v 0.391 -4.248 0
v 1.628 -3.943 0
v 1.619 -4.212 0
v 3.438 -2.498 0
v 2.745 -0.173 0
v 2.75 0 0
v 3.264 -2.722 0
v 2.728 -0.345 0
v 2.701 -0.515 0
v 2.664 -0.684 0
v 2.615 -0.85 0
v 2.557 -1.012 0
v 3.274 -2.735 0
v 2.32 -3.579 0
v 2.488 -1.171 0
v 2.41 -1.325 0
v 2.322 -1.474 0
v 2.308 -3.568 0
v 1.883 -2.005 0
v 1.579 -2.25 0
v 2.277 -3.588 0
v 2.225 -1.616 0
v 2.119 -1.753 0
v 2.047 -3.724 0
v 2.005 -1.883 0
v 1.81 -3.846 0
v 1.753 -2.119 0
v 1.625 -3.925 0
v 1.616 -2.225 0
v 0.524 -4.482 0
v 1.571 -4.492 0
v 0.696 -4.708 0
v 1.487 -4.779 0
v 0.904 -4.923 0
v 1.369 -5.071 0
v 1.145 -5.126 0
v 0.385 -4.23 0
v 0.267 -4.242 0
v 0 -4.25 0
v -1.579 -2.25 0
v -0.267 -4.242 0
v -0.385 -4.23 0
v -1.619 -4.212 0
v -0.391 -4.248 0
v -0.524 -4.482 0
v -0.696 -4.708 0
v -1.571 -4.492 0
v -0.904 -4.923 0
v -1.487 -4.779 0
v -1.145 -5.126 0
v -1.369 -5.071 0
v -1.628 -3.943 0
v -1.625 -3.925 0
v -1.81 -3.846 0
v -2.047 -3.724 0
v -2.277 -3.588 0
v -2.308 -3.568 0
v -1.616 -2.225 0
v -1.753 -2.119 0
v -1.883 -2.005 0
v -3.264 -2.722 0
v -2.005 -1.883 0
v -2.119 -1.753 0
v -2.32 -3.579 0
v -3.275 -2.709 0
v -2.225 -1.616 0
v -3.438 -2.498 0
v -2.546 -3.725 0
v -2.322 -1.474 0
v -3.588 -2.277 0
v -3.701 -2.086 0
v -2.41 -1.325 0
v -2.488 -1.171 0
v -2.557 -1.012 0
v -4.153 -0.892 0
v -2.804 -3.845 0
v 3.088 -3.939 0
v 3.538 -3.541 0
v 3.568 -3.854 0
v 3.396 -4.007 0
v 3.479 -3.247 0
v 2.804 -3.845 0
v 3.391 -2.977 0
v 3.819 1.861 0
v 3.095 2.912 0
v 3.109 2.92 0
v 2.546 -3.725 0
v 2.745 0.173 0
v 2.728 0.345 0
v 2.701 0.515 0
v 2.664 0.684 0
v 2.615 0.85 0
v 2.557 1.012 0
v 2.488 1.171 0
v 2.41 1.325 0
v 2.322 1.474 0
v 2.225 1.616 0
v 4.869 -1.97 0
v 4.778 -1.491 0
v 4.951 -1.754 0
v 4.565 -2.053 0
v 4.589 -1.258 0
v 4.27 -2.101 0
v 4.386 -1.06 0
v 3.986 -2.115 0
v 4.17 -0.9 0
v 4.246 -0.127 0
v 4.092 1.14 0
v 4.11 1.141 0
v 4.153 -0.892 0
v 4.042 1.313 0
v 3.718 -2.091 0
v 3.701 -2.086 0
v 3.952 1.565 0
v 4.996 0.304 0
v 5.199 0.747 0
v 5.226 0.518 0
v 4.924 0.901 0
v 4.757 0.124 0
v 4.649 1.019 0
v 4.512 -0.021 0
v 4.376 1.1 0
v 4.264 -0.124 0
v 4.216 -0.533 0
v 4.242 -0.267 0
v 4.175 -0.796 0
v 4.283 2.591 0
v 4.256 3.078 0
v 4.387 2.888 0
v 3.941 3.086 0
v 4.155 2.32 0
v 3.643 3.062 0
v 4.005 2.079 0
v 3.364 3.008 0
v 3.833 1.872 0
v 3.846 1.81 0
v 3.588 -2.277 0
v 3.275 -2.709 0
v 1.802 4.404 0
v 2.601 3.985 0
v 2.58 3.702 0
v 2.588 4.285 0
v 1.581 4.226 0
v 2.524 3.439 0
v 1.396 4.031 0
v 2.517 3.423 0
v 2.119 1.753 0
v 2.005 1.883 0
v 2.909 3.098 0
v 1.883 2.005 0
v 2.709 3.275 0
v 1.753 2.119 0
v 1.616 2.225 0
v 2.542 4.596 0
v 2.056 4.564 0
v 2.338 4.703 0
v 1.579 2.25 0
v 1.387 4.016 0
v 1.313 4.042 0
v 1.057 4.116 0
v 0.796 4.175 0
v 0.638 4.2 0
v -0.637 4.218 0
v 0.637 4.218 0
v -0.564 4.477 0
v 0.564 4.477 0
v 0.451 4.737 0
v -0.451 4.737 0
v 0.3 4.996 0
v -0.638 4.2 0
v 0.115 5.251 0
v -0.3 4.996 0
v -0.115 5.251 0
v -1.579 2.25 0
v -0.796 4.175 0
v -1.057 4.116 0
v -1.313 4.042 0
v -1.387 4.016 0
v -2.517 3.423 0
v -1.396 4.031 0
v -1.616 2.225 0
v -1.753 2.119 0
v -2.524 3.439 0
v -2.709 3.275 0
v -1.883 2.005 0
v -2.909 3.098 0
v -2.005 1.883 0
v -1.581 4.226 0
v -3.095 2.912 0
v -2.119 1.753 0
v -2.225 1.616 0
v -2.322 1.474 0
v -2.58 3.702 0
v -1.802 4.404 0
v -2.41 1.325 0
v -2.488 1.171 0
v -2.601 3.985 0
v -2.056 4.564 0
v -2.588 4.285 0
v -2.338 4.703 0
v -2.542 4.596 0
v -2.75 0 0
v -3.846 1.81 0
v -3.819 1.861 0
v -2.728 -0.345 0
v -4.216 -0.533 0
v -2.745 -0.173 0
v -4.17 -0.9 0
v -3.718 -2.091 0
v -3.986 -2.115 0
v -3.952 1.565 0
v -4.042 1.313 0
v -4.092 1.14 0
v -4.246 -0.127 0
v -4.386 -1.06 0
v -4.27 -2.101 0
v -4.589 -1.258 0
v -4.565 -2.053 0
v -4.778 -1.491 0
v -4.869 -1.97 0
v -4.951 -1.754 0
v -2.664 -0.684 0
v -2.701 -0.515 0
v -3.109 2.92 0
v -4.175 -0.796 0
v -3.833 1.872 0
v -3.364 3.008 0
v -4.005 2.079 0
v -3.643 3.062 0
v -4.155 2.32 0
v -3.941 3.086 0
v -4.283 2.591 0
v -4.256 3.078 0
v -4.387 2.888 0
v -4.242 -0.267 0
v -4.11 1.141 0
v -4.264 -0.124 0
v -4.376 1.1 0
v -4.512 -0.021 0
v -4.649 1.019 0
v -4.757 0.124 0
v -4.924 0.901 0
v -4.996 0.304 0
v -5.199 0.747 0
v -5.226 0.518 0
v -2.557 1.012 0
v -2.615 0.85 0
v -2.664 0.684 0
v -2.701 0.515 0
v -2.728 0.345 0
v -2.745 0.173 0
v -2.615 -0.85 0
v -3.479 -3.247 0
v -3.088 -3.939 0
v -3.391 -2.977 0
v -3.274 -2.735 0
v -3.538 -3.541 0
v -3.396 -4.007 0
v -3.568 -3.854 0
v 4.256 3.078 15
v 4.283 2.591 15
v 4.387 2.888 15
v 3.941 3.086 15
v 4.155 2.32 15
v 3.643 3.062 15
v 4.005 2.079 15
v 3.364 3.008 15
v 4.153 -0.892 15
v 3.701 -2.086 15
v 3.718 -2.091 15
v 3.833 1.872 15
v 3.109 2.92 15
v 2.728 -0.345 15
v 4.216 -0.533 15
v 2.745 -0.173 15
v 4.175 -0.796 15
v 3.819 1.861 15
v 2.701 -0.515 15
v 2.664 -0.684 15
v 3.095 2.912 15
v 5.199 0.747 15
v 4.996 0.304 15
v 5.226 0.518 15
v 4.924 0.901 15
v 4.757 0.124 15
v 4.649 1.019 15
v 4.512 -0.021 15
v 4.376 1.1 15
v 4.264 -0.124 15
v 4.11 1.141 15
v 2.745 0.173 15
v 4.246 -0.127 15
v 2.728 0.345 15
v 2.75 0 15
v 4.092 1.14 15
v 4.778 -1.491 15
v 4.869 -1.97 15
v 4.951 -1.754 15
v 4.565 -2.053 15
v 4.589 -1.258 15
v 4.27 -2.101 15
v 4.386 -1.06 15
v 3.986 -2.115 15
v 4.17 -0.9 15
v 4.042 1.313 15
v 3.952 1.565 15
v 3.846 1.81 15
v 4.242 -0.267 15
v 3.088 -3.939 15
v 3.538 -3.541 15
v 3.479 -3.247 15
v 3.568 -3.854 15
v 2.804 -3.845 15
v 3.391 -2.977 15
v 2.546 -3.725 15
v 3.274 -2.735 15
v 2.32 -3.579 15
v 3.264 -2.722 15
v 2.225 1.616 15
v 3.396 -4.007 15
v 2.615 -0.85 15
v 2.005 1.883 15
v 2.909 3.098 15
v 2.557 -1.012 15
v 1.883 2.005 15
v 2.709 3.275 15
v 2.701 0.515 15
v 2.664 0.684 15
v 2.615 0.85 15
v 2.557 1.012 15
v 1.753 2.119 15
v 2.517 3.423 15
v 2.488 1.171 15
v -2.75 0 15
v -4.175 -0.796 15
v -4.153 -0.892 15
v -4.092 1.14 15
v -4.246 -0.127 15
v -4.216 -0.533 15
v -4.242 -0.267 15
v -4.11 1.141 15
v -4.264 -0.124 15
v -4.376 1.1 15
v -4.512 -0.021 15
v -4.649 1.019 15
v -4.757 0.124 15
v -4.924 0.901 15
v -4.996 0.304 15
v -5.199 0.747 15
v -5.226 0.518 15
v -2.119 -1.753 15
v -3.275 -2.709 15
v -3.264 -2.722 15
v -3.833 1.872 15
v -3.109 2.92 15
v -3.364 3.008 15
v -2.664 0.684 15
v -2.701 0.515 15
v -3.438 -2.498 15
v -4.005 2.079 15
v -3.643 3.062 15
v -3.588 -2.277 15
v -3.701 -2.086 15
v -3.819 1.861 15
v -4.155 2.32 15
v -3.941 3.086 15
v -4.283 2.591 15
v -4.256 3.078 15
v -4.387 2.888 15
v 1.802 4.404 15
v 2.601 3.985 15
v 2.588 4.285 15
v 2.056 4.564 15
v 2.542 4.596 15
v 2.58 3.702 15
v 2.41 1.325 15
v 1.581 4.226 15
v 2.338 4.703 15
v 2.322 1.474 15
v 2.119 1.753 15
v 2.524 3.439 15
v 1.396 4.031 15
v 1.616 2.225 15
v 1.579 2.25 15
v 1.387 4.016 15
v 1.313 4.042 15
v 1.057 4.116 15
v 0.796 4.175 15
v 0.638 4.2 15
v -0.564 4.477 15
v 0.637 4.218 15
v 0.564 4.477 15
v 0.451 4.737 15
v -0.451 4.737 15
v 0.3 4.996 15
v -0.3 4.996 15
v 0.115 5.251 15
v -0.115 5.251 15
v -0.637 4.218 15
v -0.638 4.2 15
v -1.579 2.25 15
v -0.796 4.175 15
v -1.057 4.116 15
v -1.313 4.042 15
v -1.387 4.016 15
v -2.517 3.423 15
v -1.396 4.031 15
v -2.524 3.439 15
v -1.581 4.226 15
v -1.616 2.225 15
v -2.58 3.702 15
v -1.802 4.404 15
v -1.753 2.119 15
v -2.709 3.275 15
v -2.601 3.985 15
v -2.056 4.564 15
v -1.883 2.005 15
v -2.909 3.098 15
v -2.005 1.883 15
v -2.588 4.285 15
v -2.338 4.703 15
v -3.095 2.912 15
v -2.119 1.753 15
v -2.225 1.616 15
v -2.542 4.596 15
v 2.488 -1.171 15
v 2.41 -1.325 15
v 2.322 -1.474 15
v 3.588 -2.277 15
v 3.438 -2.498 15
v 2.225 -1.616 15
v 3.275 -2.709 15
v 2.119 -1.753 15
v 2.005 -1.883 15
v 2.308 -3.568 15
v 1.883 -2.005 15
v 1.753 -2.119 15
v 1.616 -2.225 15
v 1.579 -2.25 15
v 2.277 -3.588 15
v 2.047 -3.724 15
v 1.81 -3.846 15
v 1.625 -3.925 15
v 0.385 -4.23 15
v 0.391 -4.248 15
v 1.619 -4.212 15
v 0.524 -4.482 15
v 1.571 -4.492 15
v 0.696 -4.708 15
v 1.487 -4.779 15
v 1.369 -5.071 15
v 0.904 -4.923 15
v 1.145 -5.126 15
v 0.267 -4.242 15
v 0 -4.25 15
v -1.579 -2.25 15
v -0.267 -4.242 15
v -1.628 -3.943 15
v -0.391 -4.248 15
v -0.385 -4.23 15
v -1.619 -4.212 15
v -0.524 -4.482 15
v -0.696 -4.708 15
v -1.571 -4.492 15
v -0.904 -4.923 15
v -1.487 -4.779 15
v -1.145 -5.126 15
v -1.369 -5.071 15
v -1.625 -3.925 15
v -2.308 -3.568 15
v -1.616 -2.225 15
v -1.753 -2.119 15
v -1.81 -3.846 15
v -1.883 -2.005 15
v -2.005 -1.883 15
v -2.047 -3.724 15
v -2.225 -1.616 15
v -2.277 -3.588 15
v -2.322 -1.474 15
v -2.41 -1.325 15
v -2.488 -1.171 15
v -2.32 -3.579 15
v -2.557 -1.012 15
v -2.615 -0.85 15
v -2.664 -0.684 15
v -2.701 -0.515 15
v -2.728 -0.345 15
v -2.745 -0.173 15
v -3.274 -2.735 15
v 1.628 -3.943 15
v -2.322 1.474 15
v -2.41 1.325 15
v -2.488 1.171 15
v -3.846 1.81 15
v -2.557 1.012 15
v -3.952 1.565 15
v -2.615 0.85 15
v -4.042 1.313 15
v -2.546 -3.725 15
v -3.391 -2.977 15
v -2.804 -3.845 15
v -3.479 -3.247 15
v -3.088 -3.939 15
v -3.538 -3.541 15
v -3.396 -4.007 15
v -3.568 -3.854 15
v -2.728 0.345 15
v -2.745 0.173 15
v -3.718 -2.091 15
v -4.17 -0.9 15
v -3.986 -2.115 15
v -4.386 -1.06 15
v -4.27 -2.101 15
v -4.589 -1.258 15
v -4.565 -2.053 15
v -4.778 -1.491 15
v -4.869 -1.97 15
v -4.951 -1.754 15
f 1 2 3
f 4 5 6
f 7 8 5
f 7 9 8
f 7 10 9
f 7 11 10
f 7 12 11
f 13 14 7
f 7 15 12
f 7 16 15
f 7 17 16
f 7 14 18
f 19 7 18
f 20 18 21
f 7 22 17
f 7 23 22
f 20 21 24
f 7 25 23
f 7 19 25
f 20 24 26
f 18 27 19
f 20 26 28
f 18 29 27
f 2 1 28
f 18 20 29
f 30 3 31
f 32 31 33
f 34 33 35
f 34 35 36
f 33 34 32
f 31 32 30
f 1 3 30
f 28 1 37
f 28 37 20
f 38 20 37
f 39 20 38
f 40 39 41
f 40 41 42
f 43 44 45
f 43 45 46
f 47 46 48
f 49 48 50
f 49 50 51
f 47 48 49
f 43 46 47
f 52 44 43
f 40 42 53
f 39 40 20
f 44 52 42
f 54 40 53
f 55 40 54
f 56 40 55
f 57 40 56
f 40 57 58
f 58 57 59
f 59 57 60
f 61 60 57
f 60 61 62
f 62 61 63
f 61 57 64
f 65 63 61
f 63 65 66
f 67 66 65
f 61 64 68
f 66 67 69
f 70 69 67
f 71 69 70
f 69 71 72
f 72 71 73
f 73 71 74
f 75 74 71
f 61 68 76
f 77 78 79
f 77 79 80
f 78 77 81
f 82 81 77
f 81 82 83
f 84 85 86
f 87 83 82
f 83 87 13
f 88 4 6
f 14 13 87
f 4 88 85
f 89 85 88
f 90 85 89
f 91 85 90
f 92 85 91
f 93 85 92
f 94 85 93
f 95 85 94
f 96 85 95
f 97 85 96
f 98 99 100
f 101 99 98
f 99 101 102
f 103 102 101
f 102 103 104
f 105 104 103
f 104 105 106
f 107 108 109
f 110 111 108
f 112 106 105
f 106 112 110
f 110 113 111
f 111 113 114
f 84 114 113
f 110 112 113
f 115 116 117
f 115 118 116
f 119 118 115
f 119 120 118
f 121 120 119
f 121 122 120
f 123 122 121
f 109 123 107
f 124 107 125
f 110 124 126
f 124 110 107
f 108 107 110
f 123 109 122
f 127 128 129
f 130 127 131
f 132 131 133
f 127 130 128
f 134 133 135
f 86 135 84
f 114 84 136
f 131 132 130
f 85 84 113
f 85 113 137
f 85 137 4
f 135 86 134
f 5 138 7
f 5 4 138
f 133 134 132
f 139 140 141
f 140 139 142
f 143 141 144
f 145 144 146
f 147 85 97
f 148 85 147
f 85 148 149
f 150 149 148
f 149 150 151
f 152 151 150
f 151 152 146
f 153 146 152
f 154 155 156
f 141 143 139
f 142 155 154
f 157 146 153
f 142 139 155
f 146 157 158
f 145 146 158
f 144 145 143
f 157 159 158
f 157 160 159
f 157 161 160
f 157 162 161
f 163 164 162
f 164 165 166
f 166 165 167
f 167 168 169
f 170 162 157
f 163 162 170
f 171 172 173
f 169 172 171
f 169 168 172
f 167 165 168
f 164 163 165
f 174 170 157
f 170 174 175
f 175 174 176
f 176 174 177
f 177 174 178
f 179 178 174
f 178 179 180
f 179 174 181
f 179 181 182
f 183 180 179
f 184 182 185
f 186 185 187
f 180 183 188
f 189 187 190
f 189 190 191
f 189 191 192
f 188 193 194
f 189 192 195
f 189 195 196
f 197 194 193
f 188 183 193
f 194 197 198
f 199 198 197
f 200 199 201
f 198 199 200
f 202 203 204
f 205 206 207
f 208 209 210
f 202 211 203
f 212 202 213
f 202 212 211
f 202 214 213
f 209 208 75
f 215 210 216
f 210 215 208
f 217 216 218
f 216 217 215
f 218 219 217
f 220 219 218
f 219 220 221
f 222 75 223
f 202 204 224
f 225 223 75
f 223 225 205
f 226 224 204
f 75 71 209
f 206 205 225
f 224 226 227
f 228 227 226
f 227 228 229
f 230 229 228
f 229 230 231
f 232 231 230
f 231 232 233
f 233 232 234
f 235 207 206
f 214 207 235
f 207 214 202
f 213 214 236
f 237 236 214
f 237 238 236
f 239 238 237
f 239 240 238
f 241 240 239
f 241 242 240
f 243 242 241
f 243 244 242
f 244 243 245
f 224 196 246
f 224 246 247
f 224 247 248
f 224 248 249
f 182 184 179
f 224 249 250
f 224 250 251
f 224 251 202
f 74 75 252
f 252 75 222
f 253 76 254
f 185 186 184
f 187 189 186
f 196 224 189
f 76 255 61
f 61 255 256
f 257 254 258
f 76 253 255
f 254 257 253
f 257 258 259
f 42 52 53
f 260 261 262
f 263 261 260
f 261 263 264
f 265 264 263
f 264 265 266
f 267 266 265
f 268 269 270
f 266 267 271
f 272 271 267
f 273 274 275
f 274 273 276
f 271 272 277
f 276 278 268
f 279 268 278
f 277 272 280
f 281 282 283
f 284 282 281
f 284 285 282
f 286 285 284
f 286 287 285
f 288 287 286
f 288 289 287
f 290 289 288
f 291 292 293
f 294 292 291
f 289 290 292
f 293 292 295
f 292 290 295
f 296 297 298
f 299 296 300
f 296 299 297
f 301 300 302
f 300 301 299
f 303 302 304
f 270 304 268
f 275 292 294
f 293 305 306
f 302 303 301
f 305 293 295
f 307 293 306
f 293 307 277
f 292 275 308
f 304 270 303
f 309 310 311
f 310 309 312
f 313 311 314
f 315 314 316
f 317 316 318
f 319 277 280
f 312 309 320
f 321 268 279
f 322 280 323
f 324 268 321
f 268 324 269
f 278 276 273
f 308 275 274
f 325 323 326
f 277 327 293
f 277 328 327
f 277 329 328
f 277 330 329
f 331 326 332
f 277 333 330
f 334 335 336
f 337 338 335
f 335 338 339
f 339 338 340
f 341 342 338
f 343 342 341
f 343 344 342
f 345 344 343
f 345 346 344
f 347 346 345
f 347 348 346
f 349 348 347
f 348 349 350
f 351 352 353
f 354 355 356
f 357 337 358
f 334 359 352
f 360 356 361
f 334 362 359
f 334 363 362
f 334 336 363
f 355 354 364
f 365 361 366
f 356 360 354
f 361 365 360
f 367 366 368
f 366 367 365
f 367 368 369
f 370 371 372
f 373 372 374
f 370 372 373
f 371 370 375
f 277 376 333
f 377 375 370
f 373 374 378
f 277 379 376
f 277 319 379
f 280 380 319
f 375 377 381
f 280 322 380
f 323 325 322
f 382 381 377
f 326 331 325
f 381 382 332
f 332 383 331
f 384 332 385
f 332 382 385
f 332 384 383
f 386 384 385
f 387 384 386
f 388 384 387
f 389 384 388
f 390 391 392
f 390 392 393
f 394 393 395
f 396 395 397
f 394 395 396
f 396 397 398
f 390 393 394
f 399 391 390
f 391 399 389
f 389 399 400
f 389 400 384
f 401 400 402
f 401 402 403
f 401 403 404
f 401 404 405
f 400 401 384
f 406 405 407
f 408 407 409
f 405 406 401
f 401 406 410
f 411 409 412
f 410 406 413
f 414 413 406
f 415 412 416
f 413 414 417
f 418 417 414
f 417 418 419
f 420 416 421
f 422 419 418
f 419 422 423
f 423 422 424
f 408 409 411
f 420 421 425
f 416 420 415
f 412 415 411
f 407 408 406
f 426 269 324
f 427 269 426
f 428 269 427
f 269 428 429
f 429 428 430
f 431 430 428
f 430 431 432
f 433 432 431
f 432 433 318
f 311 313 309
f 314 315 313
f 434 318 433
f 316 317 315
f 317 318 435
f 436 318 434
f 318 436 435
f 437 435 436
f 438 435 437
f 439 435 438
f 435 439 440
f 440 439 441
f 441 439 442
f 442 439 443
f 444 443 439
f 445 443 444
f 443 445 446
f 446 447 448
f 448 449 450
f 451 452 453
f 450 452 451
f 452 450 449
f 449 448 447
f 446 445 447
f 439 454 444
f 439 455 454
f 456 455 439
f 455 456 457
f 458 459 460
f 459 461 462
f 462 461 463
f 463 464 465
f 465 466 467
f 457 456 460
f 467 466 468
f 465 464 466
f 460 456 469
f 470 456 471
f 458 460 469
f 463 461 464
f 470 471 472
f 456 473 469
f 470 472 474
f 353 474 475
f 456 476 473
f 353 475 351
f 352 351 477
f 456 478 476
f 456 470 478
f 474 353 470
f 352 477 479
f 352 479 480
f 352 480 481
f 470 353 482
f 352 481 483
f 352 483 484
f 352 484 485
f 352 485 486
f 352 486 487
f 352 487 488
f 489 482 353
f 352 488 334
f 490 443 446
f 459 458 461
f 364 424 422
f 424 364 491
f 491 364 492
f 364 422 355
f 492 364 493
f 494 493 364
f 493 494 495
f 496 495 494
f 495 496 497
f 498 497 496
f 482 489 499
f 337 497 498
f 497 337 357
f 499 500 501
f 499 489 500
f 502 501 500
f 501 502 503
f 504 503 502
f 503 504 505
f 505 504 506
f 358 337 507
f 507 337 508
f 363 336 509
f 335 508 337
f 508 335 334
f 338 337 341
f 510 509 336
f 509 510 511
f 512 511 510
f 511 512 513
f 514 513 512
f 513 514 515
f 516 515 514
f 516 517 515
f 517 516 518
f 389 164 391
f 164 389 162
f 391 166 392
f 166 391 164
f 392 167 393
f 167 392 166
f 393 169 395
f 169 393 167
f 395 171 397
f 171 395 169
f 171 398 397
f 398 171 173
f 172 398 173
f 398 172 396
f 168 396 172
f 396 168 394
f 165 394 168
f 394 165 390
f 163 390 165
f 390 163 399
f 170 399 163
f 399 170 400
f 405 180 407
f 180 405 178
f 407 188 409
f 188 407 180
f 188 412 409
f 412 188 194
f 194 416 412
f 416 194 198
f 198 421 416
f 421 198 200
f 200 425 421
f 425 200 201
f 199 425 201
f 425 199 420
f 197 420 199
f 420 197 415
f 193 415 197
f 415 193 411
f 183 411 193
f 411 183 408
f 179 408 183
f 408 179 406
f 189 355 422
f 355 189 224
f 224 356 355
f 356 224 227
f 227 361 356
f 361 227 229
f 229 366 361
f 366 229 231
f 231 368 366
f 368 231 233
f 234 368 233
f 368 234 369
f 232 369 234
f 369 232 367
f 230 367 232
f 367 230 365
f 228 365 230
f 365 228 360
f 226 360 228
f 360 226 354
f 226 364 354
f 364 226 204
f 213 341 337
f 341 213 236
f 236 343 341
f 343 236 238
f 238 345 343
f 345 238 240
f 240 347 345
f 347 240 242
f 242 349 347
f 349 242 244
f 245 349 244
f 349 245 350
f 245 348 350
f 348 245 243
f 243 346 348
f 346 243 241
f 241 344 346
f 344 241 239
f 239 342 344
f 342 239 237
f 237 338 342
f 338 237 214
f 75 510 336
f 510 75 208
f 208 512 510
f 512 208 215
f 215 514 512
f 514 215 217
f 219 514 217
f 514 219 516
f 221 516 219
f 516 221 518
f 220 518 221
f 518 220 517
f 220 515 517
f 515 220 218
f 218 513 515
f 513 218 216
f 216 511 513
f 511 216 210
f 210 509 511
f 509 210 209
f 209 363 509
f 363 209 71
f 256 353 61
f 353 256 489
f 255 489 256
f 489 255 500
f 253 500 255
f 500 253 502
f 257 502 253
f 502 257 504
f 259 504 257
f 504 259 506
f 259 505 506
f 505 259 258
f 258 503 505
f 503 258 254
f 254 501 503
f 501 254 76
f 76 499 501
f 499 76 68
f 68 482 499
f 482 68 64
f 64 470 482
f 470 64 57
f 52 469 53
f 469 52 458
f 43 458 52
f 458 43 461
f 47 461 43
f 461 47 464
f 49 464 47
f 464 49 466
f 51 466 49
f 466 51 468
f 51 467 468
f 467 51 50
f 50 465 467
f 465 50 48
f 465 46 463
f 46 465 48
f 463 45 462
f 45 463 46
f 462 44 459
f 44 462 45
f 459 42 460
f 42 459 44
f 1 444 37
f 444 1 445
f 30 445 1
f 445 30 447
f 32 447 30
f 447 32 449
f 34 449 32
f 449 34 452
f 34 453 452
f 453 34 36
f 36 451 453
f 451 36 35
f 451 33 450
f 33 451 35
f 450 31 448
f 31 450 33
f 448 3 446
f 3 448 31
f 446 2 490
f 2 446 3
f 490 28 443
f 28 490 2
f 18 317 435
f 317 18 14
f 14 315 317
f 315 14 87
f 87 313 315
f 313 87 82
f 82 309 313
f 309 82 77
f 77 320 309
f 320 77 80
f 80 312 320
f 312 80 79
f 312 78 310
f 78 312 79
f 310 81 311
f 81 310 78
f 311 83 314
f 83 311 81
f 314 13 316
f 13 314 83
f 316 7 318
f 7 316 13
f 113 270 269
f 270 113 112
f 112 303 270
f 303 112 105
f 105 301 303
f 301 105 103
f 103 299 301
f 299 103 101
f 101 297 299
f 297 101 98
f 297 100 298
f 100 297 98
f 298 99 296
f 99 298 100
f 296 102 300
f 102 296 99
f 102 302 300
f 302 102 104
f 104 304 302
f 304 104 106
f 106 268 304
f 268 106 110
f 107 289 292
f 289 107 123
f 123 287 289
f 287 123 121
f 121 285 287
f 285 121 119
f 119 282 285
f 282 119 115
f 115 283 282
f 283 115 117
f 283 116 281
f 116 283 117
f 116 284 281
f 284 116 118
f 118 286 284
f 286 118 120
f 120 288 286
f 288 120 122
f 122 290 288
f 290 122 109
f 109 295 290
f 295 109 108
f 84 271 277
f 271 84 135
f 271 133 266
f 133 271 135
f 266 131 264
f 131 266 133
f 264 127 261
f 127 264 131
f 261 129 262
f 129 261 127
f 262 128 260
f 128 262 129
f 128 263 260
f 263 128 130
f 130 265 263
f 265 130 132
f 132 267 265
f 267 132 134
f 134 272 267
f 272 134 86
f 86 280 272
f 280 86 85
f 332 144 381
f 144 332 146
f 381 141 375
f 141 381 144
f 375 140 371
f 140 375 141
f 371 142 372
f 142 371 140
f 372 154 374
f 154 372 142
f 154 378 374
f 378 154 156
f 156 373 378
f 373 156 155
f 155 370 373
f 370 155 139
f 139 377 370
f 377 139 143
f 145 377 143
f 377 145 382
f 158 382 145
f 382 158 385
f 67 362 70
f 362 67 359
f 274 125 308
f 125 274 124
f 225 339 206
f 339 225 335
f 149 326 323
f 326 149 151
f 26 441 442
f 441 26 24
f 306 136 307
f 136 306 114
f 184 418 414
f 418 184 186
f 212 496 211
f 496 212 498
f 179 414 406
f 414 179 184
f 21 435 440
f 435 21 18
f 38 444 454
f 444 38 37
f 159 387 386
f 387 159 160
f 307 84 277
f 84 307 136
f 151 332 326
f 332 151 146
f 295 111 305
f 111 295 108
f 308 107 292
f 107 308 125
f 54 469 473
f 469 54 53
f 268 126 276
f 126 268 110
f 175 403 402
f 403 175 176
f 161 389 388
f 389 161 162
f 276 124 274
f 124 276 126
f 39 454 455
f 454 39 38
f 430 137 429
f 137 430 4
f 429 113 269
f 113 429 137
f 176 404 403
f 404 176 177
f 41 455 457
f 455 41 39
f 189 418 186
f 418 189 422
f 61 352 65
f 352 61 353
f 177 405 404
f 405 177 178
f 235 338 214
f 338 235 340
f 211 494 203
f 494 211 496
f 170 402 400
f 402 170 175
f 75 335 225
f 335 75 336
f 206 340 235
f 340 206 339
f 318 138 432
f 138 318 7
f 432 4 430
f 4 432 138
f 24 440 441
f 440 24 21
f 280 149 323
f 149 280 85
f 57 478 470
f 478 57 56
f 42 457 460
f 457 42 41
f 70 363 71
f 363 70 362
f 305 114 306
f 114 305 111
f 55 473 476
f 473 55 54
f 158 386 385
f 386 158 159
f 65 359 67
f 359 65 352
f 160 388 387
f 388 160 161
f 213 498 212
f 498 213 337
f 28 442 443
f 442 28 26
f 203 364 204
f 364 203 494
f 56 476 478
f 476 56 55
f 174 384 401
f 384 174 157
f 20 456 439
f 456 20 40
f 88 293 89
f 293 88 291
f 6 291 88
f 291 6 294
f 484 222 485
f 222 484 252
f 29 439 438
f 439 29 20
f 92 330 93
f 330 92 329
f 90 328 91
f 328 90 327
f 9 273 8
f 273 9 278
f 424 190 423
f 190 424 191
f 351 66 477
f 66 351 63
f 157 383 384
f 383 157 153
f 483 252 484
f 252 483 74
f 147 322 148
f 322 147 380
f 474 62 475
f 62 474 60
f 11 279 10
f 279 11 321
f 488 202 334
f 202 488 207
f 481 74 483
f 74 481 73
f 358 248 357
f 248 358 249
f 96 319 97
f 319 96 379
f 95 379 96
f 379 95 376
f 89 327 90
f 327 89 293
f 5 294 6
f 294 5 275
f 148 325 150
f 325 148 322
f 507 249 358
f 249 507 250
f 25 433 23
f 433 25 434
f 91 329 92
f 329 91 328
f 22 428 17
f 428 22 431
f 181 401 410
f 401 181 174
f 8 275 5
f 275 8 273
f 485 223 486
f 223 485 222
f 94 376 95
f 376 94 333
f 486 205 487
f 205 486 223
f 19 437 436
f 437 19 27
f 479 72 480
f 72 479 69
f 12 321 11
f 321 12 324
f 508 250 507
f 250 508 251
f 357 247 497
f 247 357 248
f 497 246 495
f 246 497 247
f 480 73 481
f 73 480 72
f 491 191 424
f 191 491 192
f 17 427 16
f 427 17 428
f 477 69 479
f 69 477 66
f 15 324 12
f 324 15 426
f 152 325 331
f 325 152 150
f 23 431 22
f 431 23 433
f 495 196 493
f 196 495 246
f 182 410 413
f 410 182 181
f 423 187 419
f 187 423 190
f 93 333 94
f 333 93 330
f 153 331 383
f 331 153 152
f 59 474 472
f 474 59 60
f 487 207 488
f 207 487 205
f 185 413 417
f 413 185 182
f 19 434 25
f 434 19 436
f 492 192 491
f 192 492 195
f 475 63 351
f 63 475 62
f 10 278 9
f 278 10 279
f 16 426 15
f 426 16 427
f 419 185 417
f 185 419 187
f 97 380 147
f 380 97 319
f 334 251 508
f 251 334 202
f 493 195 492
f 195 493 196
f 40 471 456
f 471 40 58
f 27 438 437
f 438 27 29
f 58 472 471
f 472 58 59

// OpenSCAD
//This is a modification of " Public Domain Parametric Involute Spur Gear (and involute helical gear and involute rack)
// by Leemon Baird, 2011, Leemon@Leemon.com
//http://www.thingiverse.com/thing:5505  "

//Modifications by racatack June 2016:
//  -Incorporated 'module InvoluteGear_rack()' from the 11/11/15 comment by quisam2342 in thing:5505 to fix noted problems in rack generation at various tooth sizes
//  -Added a section for an optional 'backboard' that can be used to stiffen an otherwise skinny rack
//  -Added sections for optional Stop Blocks at either or both ends of a rack
//  -Removed extra gears from the example since I only need one pinion. See thing:5505 example section to gain more insight into gear generation.





//////////////////////////////////////////////////////////////////////////////////////////////
// Public Domain Parametric Involute Spur Gear (and involute helical gear and involute rack)
// version 1.1
// by Leemon Baird, 2011, Leemon@Leemon.com
//http://www.thingiverse.com/thing:5505
//
// This file is public domain.  Use it for any purpose, including commercial
// applications.  Attribution would be nice, but is not required.  There is
// no warranty of any kind, including its correctness, usefulness, or safety.
// 
// This is parameterized involute spur (or helical) gear.  It is much simpler and less powerful than
// others on Thingiverse.  But it is public domain.  I implemented it from scratch from the 
// descriptions and equations on Wikipedia and the web, using Mathematica for calculations and testing,
// and I now release it into the public domain.
//
//		http://en.wikipedia.org/wiki/Involute_gear
//		http://en.wikipedia.org/wiki/Gear
//		http://en.wikipedia.org/wiki/List_of_gear_nomenclature
//		http://gtrebaol.free.fr/doc/catia/spur_gear.html
//		http://www.cs.cmu.edu/~rapidproto/mechanisms/chpt7.html
//
// The module gear() gives an involute spur gear, with reasonable defaults for all the parameters.
// Normally, you should just choose the first 4 parameters, and let the rest be default values.
// The module gear() gives a gear in the XY plane, centered on the origin, with one tooth centered on
// the positive Y axis.  The various functions below it take the same parameters, and return various
// measurements for the gear.  The most important is pitch_radius, which tells how far apart to space
// gears that are meshing, and adendum_radius, which gives the size of the region filled by the gear.
// A gear has a "pitch circle", which is an invisible circle that cuts through the middle of each
// tooth (though not the exact center). In order for two gears to mesh, their pitch circles should 
// just touch.  So the distance between their centers should be pitch_radius() for one, plus pitch_radius() 
// for the other, which gives the radii of their pitch circles.
//
// In order for two gears to mesh, they must have the same mm_per_tooth and pressure_angle parameters.  
// mm_per_tooth gives the number of millimeters of arc around the pitch circle covered by one tooth and one
// space between teeth.  The pitch angle controls how flat or bulged the sides of the teeth are.  Common
// values include 14.5 degrees and 20 degrees, and occasionally 25.  Though I've seen 28 recommended for
// plastic gears. Larger numbers bulge out more, giving stronger teeth, so 28 degrees is the default here.
//
// The ratio of number_of_teeth for two meshing gears gives how many times one will make a full 
// revolution when the the other makes one full revolution.  If the two numbers are coprime (i.e. 
// are not both divisible by the same number greater than 1), then every tooth on one gear
// will meet every tooth on the other, for more even wear.  So coprime numbers of teeth are good.
//
// The module rack() gives a rack, which is a bar with teeth.  A rack can mesh with any
// gear that has the same mm_per_tooth and pressure_angle.
//
// Some terminology: 
// The outline of a gear is a smooth circle (the "pitch circle") which has mountains and valleys
// added so it is toothed.  So there is an inner circle (the "root circle") that touches the 
// base of all the teeth, an outer circle that touches the tips of all the teeth,
// and the invisible pitch circle in between them.  There is also a "base circle", which can be smaller than
// all three of the others, which controls the shape of the teeth.  The side of each tooth lies on the path 
// that the end of a string would follow if it were wrapped tightly around the base circle, then slowly unwound.  
// That shape is an "involute", which gives this type of gear its name.
//
//////////////////////////////////////////////////////////////////////////////////////////////

//An involute spur gear, with reasonable defaults for all the parameters.
//Normally, you should just choose the first 4 parameters, and let the rest be default values.
//Meshing gears must match in mm_per_tooth, pressure_angle, and twist,
//and be separated by the sum of their pitch radii, which can be found with pitch_radius().
module gear (
	mm_per_tooth    = 3,    //this is the "circular pitch", the circumference of the pitch circle divided by the number of teeth
	number_of_teeth = 11,   //total number of teeth around the entire perimeter
	thickness       = 6,    //thickness of gear in mm
	hole_diameter   = 3,    //diameter of the hole in the center, in mm
	twist           = 0,    //teeth rotate this many degrees from bottom of gear to top.  360 makes the gear a screw with each thread going around once
	teeth_to_hide   = 0,    //number of teeth to delete to make this only a fraction of a circle
	pressure_angle  = 28,   //Controls how straight or bulged the tooth sides are. In degrees.
	clearance       = 0.0,  //gap between top of a tooth on one gear and bottom of valley on a meshing gear (in millimeters)
	backlash        = 0.0   //gap between two meshing teeth, in the direction along the circumference of the pitch circle
) {
	assign(pi = 3.1415926)
	assign(p  = mm_per_tooth * number_of_teeth / pi / 2)  //radius of pitch circle
	assign(c  = p + mm_per_tooth / pi - clearance)        //radius of outer circle
	assign(b  = p*cos(pressure_angle))                    //radius of base circle
	assign(r  = p-(c-p)-clearance)                        //radius of root circle
	assign(t  = mm_per_tooth/2-backlash/2)                //tooth thickness at pitch circle
	assign(k  = -iang(b, p) - t/2/p/pi*180) {             //angle to where involute meets base circle on each side of tooth
		difference() {
			for (i = [0:number_of_teeth-teeth_to_hide-1] )
				rotate([0,0,i*360/number_of_teeth])
					linear_extrude(height = thickness, center = true, convexity = 10, twist = twist)
						polygon(
							points=[
								[0, -hole_diameter/10],
								polar(r, -181/number_of_teeth),
								polar(r, r<b ? k : -180/number_of_teeth),
								q7(0/5,r,b,c,k, 1),q7(1/5,r,b,c,k, 1),q7(2/5,r,b,c,k, 1),q7(3/5,r,b,c,k, 1),q7(4/5,r,b,c,k, 1),q7(5/5,r,b,c,k, 1),
								q7(5/5,r,b,c,k,-1),q7(4/5,r,b,c,k,-1),q7(3/5,r,b,c,k,-1),q7(2/5,r,b,c,k,-1),q7(1/5,r,b,c,k,-1),q7(0/5,r,b,c,k,-1),
								polar(r, r<b ? -k : 180/number_of_teeth),
								polar(r, 181/number_of_teeth)
							],
 							paths=[[0,1,2,3,4,5,6,7,8,9,10,11,12,13,14,15,16]]
						);
			cylinder(h=2*thickness+1, r=hole_diameter/2, center=true, $fn=20);
		}
	}
};	
//these 4 functions are used by gear
function polar(r,theta)   = r*[sin(theta), cos(theta)];                            //convert polar to cartesian coordinates
function iang(r1,r2)      = sqrt((r2/r1)*(r2/r1) - 1)/3.1415926*180 - acos(r1/r2); //unwind a string this many degrees to go from radius r1 to radius r2
function q7(f,r,b,r2,t,s) = q6(b,s,t,(1-f)*max(b,r)+f*r2);                         //radius a fraction f up the curved side of the tooth 
function q6(b,s,t,d)      = polar(d,s*(iang(b,d)+t));                              //point at radius d on the involute curve

//a rack, which is a straight line with teeth (the same as a segment from a giant gear with a huge number of teeth).
//The "pitch circle" is a line along the X axis.
//module rack (
//	mm_per_tooth    = 3,    //this is the "circular pitch", the circumference of the pitch circle divided by the number //of teeth
//	number_of_teeth = 11,   //total number of teeth along the rack
//	thickness       = 6,    //thickness of rack in mm (affects each tooth)
//	height          = 120,   //height of rack in mm, from tooth top to far side of rack.
//	pressure_angle  = 28,   //Controls how straight or bulged the tooth sides are. In degrees.
//	backlash        = 0.0   //gap between two meshing teeth, in the direction along the circumference of the pitch circle
//) {
//	assign(pi = 3.1415926)
//	assign(a = mm_per_tooth / pi) //addendum
//	assign(t = a*cos(pressure_angle)-1)         //tooth side is tilted so top/bottom corners move this amount
//		for (i = [0:number_of_teeth-1] )
//			translate([i*mm_per_tooth,0,0])
//				linear_extrude(height = thickness, center = true, convexity = 10)
//					polygon(
//						points=[
//							[-mm_per_tooth * 3/4,                 a-height],
//							[-mm_per_tooth * 3/4 - backlash,     -a],
//							[-mm_per_tooth * 1/4 + backlash - t, -a],
//							[-mm_per_tooth * 1/4 + backlash + t,  a],
//							[ mm_per_tooth * 1/4 - backlash - t,  a],
//							[ mm_per_tooth * 1/4 - backlash + t, -a],
//							[ mm_per_tooth * 3/4 + backlash,     -a],
//							[ mm_per_tooth * 3/4,                 a-height],
//						],
//						paths=[[0,1,2,3,4,5,6,7]]
//					);
//};	


  //rac note - This section generates the rack body and teeth. It is from the 11/11/15 comment by quisam2342 in thing:5505 to fix noted problems with rack generation, and replaces the original 'module rack()'
////////////////////////////////////////////////////////////////////////////////////////////////
// The module InvoluteGear_rack() gives a involute gear rack, which is a bar with teeth.
// A rack can mesh with any gear that has the same mm_per_tooth and pressure_angle.
// The "pitch circle" is a line along the X axis.
//
// mm_per_tooth     this is the "circular pitch", the circumference of the pitch circle
//                  divided by the number of teeth
//
// number_of_teeth  total number of teeth along the rack
//
// thickness        thickness of rack in mm
//
// height           height of rack in mm, from tooth top to far side of rack
//
// pressure_angle   controls how straight or bulged the tooth sides are, in degrees
//
// clearance        gap between top of a tooth on one gear and bottom of valley
//                  on a meshing gear, in millimeters
//
// backlash         gap between two meshing teeth, in the direction along the circumference
//                  of the pitch circle
////////////////////////////////////////////////////////////////////////////////////////////////



module InvoluteGear_rack (
    mm_per_tooth    = 3,   //Default numbers in this section get overridden by numbers in 'example rack and pinion' section, so set your values there.
    number_of_teeth = 11,
    thickness       = 6,
    height          = 4,
    
  //rac - Added variables for backboard and stop blocks: 
 //set your values in the 'example rack and pinion' section, as defaults given here will be overridden by that section 
    backboard_thickness = 2.0,
    backboard_height = 1.0, 
    stop_height = backboard_height, 
    left_stop_enable = 1, 
    right_stop_enable = 1,
    
//These defaults are not redefined in the example section:
    pressure_angle  = 28,  
    clearance       = 0.0,
    backlash        = 0.0

)

{
    // addendum - tooth height above pitch line
    assign(addendum =        module_value(mm_per_tooth) - clearance)

    // dedendum - tooth height below pitch line
    assign(dedendum = 1.25 * module_value(mm_per_tooth)            ) 


    for (i = [0:number_of_teeth-1] )
        translate([(i+0.5)*mm_per_tooth,height-addendum,0])
            linear_extrude(height = thickness, center = true, convexity = 10)  //'height' parameter here is not the same as 'height' parameter of module
                polygon(
                    points=[
                        [-1/2 * mm_per_tooth,                                              addendum-height],
                        [-1/2 * mm_per_tooth,                                             -dedendum],
                        [-1/4 * mm_per_tooth + backlash - dedendum * tan(pressure_angle), -dedendum],
                        [-1/4 * mm_per_tooth + backlash + addendum * tan(pressure_angle),  addendum],
                        [ 1/4 * mm_per_tooth - backlash - addendum * tan(pressure_angle),  addendum],
                        [ 1/4 * mm_per_tooth - backlash + dedendum * tan(pressure_angle), -dedendum],
                        [ 1/2 * mm_per_tooth,                                             -dedendum],
                        [ 1/2 * mm_per_tooth,                                              addendum-height],
                    ],
                    paths=[[0,1,2,3,4,5,6,7]]
                );

   //rac -added - This section optionally creates a 'stop block' at the left end of the rack
            translate([(-0.11)*mm_per_tooth,0,0.5*(-thickness)])  
            linear_extrude(height = left_stop_enable*thickness, center = false, convexity = 10)
                polygon(
                    points=[
                        [-1/2 * mm_per_tooth,height+stop_height],   //stop_height extends stop block above teeth, change the number to change the extension amount
                        [-1/2 * mm_per_tooth,0],
                        [ 1/2 * mm_per_tooth,0],
                        [ 1/2 * mm_per_tooth,height+stop_height],   //stop_height extends stop block above teeth, change the number to change the extension amount
                    ],
                    paths=[[0,1,2,3]]
                );


    //rac -added - This section optionally creates a 'stop block' at the right end of the rack
            translate([(0.11+number_of_teeth)*mm_per_tooth,0,0.5*(-thickness)])  
            linear_extrude(height = right_stop_enable*thickness, center = false, convexity = 10)
                polygon(
                    points=[
                        [-1/2 * mm_per_tooth,height+stop_height],   //stop_height extends stop block above teeth
                        [-1/2 * mm_per_tooth,0],
                        [ 1/2 * mm_per_tooth,0],
                        [ 1/2 * mm_per_tooth,height+stop_height],   //stop_height extends stop block above teeth
                    ],
                    paths=[[0,1,2,3]]
                );


    //rac -added - This section optionally creates a 'backboard' on one side of the rack. Can be used to add stiffness for a 'thin' rack (i.e. a rack with low height and/or thickness numbers) or if a large negative height is used it can extend under the rack as a mounting flange.
    for (i = [0:number_of_teeth-1] )
        translate([(i+0.5)*mm_per_tooth,0,0.5*(-thickness+backboard_thickness)])    
        //0.55*(-thickness+backboard_thickness) starts the backboard at one side of the rack and extrudes it inward
            linear_extrude(height = backboard_thickness, center = true, convexity = 10)
                polygon(
                    points=[
                        [-1/2 * mm_per_tooth,height+backboard_height],   //backboard_height extends backboard above teeth
                        [-1/2 * mm_per_tooth,0],

                        [ 1/2 * mm_per_tooth,0],
                        [ 1/2 * mm_per_tooth,height+backboard_height],   //backboard_height extends backboard above teeth
                    ],
                    paths=[[0,1,2,3]]
                );


}


//These 5 functions let the user find the derived dimensions of the gear.
//A gear fits within a circle of radius outer_radius, and two gears should have
//their centers separated by the sum of their pictch_radius.
function circular_pitch  (mm_per_tooth=3) = mm_per_tooth;                     //tooth density expressed as "circular pitch" in millimeters
function diametral_pitch (mm_per_tooth=3) = 3.1415926 / mm_per_tooth;         //tooth density expressed as "diametral pitch" in teeth per millimeter
function module_value    (mm_per_tooth=3) = mm_per_tooth / 3.1415926;                //tooth density expressed as "module" or "modulus" in millimeters
function pitch_radius    (mm_per_tooth=3,number_of_teeth=11) = mm_per_tooth * number_of_teeth / 3.1415926 / 2;
function outer_radius    (mm_per_tooth=3,number_of_teeth=11,clearance=0.1)    //The gear fits entirely within a cylinder of this radius.
	= mm_per_tooth*(1+number_of_teeth/2)/3.1415926  - clearance;              

//////////////////////////////////////////////////////////////////////////////////////////////
//example rack and pinion: 
//ENTER YOUR VALUES HERE: (not in InvoluteGear_rack() defaults)

//all distances in mm
n1 = 8; //red gear number of teeth
n5 = 25;  //gray rack number of teeth
mm_per_tooth = 3.25; //all meshing gears need the same mm_per_tooth (and the same pressure_angle)
thickness    = 10;  // depth of the rack, including backboard if any. The pinion will be this depth minus the backboard_thickness
hole         = 2;   //hole diameter in pinion gear
height       = 4;  // distance from bottom of the rack to the tips of the teeth

//rac - Added - Set your values for Backboard and Stop Blocks here 
backboard_thickness = 1.0; //set to zero for no backboard
backboard_height = 2;   //set to zero for top of backboard to be even with tips of teeth, a positive number will extend above the teeth by the chosen amount, vice-versa for negative (use large negative to make a flange on underside of rack)
stop_height = 2; //Stop Blocks will extend this much above the teeth, can be positive or negative
left_stop_enable = 1;  //set to 1 to generate Left Stop Block, set to 0 to disable
right_stop_enable = 1;  //set to 1 to generate Right Stop Block, set to 0 to disable

//end of inputs -------------------------------------------------------

d1 =pitch_radius(mm_per_tooth,n1);

$fn=100;

cylinder_r = 10.5/2;
h=15;

r_int=5.5/2;
r_int2=4.5/2;

//Generation of pinion gear:
difference(){
    union(){
        translate([0,0,h/2])gear(2.2,13,h,0);
        cylinder(r=cylinder_r-1, h);
    }
    difference(){
        cylinder(r=r_int, 20);
        for(i=[0,1]){
            mirror([0,i,0])translate([-15,r_int2,0]) cube([30,30,30]);
        }
    }
}

%cylinder(r=cylinder_r, h);
